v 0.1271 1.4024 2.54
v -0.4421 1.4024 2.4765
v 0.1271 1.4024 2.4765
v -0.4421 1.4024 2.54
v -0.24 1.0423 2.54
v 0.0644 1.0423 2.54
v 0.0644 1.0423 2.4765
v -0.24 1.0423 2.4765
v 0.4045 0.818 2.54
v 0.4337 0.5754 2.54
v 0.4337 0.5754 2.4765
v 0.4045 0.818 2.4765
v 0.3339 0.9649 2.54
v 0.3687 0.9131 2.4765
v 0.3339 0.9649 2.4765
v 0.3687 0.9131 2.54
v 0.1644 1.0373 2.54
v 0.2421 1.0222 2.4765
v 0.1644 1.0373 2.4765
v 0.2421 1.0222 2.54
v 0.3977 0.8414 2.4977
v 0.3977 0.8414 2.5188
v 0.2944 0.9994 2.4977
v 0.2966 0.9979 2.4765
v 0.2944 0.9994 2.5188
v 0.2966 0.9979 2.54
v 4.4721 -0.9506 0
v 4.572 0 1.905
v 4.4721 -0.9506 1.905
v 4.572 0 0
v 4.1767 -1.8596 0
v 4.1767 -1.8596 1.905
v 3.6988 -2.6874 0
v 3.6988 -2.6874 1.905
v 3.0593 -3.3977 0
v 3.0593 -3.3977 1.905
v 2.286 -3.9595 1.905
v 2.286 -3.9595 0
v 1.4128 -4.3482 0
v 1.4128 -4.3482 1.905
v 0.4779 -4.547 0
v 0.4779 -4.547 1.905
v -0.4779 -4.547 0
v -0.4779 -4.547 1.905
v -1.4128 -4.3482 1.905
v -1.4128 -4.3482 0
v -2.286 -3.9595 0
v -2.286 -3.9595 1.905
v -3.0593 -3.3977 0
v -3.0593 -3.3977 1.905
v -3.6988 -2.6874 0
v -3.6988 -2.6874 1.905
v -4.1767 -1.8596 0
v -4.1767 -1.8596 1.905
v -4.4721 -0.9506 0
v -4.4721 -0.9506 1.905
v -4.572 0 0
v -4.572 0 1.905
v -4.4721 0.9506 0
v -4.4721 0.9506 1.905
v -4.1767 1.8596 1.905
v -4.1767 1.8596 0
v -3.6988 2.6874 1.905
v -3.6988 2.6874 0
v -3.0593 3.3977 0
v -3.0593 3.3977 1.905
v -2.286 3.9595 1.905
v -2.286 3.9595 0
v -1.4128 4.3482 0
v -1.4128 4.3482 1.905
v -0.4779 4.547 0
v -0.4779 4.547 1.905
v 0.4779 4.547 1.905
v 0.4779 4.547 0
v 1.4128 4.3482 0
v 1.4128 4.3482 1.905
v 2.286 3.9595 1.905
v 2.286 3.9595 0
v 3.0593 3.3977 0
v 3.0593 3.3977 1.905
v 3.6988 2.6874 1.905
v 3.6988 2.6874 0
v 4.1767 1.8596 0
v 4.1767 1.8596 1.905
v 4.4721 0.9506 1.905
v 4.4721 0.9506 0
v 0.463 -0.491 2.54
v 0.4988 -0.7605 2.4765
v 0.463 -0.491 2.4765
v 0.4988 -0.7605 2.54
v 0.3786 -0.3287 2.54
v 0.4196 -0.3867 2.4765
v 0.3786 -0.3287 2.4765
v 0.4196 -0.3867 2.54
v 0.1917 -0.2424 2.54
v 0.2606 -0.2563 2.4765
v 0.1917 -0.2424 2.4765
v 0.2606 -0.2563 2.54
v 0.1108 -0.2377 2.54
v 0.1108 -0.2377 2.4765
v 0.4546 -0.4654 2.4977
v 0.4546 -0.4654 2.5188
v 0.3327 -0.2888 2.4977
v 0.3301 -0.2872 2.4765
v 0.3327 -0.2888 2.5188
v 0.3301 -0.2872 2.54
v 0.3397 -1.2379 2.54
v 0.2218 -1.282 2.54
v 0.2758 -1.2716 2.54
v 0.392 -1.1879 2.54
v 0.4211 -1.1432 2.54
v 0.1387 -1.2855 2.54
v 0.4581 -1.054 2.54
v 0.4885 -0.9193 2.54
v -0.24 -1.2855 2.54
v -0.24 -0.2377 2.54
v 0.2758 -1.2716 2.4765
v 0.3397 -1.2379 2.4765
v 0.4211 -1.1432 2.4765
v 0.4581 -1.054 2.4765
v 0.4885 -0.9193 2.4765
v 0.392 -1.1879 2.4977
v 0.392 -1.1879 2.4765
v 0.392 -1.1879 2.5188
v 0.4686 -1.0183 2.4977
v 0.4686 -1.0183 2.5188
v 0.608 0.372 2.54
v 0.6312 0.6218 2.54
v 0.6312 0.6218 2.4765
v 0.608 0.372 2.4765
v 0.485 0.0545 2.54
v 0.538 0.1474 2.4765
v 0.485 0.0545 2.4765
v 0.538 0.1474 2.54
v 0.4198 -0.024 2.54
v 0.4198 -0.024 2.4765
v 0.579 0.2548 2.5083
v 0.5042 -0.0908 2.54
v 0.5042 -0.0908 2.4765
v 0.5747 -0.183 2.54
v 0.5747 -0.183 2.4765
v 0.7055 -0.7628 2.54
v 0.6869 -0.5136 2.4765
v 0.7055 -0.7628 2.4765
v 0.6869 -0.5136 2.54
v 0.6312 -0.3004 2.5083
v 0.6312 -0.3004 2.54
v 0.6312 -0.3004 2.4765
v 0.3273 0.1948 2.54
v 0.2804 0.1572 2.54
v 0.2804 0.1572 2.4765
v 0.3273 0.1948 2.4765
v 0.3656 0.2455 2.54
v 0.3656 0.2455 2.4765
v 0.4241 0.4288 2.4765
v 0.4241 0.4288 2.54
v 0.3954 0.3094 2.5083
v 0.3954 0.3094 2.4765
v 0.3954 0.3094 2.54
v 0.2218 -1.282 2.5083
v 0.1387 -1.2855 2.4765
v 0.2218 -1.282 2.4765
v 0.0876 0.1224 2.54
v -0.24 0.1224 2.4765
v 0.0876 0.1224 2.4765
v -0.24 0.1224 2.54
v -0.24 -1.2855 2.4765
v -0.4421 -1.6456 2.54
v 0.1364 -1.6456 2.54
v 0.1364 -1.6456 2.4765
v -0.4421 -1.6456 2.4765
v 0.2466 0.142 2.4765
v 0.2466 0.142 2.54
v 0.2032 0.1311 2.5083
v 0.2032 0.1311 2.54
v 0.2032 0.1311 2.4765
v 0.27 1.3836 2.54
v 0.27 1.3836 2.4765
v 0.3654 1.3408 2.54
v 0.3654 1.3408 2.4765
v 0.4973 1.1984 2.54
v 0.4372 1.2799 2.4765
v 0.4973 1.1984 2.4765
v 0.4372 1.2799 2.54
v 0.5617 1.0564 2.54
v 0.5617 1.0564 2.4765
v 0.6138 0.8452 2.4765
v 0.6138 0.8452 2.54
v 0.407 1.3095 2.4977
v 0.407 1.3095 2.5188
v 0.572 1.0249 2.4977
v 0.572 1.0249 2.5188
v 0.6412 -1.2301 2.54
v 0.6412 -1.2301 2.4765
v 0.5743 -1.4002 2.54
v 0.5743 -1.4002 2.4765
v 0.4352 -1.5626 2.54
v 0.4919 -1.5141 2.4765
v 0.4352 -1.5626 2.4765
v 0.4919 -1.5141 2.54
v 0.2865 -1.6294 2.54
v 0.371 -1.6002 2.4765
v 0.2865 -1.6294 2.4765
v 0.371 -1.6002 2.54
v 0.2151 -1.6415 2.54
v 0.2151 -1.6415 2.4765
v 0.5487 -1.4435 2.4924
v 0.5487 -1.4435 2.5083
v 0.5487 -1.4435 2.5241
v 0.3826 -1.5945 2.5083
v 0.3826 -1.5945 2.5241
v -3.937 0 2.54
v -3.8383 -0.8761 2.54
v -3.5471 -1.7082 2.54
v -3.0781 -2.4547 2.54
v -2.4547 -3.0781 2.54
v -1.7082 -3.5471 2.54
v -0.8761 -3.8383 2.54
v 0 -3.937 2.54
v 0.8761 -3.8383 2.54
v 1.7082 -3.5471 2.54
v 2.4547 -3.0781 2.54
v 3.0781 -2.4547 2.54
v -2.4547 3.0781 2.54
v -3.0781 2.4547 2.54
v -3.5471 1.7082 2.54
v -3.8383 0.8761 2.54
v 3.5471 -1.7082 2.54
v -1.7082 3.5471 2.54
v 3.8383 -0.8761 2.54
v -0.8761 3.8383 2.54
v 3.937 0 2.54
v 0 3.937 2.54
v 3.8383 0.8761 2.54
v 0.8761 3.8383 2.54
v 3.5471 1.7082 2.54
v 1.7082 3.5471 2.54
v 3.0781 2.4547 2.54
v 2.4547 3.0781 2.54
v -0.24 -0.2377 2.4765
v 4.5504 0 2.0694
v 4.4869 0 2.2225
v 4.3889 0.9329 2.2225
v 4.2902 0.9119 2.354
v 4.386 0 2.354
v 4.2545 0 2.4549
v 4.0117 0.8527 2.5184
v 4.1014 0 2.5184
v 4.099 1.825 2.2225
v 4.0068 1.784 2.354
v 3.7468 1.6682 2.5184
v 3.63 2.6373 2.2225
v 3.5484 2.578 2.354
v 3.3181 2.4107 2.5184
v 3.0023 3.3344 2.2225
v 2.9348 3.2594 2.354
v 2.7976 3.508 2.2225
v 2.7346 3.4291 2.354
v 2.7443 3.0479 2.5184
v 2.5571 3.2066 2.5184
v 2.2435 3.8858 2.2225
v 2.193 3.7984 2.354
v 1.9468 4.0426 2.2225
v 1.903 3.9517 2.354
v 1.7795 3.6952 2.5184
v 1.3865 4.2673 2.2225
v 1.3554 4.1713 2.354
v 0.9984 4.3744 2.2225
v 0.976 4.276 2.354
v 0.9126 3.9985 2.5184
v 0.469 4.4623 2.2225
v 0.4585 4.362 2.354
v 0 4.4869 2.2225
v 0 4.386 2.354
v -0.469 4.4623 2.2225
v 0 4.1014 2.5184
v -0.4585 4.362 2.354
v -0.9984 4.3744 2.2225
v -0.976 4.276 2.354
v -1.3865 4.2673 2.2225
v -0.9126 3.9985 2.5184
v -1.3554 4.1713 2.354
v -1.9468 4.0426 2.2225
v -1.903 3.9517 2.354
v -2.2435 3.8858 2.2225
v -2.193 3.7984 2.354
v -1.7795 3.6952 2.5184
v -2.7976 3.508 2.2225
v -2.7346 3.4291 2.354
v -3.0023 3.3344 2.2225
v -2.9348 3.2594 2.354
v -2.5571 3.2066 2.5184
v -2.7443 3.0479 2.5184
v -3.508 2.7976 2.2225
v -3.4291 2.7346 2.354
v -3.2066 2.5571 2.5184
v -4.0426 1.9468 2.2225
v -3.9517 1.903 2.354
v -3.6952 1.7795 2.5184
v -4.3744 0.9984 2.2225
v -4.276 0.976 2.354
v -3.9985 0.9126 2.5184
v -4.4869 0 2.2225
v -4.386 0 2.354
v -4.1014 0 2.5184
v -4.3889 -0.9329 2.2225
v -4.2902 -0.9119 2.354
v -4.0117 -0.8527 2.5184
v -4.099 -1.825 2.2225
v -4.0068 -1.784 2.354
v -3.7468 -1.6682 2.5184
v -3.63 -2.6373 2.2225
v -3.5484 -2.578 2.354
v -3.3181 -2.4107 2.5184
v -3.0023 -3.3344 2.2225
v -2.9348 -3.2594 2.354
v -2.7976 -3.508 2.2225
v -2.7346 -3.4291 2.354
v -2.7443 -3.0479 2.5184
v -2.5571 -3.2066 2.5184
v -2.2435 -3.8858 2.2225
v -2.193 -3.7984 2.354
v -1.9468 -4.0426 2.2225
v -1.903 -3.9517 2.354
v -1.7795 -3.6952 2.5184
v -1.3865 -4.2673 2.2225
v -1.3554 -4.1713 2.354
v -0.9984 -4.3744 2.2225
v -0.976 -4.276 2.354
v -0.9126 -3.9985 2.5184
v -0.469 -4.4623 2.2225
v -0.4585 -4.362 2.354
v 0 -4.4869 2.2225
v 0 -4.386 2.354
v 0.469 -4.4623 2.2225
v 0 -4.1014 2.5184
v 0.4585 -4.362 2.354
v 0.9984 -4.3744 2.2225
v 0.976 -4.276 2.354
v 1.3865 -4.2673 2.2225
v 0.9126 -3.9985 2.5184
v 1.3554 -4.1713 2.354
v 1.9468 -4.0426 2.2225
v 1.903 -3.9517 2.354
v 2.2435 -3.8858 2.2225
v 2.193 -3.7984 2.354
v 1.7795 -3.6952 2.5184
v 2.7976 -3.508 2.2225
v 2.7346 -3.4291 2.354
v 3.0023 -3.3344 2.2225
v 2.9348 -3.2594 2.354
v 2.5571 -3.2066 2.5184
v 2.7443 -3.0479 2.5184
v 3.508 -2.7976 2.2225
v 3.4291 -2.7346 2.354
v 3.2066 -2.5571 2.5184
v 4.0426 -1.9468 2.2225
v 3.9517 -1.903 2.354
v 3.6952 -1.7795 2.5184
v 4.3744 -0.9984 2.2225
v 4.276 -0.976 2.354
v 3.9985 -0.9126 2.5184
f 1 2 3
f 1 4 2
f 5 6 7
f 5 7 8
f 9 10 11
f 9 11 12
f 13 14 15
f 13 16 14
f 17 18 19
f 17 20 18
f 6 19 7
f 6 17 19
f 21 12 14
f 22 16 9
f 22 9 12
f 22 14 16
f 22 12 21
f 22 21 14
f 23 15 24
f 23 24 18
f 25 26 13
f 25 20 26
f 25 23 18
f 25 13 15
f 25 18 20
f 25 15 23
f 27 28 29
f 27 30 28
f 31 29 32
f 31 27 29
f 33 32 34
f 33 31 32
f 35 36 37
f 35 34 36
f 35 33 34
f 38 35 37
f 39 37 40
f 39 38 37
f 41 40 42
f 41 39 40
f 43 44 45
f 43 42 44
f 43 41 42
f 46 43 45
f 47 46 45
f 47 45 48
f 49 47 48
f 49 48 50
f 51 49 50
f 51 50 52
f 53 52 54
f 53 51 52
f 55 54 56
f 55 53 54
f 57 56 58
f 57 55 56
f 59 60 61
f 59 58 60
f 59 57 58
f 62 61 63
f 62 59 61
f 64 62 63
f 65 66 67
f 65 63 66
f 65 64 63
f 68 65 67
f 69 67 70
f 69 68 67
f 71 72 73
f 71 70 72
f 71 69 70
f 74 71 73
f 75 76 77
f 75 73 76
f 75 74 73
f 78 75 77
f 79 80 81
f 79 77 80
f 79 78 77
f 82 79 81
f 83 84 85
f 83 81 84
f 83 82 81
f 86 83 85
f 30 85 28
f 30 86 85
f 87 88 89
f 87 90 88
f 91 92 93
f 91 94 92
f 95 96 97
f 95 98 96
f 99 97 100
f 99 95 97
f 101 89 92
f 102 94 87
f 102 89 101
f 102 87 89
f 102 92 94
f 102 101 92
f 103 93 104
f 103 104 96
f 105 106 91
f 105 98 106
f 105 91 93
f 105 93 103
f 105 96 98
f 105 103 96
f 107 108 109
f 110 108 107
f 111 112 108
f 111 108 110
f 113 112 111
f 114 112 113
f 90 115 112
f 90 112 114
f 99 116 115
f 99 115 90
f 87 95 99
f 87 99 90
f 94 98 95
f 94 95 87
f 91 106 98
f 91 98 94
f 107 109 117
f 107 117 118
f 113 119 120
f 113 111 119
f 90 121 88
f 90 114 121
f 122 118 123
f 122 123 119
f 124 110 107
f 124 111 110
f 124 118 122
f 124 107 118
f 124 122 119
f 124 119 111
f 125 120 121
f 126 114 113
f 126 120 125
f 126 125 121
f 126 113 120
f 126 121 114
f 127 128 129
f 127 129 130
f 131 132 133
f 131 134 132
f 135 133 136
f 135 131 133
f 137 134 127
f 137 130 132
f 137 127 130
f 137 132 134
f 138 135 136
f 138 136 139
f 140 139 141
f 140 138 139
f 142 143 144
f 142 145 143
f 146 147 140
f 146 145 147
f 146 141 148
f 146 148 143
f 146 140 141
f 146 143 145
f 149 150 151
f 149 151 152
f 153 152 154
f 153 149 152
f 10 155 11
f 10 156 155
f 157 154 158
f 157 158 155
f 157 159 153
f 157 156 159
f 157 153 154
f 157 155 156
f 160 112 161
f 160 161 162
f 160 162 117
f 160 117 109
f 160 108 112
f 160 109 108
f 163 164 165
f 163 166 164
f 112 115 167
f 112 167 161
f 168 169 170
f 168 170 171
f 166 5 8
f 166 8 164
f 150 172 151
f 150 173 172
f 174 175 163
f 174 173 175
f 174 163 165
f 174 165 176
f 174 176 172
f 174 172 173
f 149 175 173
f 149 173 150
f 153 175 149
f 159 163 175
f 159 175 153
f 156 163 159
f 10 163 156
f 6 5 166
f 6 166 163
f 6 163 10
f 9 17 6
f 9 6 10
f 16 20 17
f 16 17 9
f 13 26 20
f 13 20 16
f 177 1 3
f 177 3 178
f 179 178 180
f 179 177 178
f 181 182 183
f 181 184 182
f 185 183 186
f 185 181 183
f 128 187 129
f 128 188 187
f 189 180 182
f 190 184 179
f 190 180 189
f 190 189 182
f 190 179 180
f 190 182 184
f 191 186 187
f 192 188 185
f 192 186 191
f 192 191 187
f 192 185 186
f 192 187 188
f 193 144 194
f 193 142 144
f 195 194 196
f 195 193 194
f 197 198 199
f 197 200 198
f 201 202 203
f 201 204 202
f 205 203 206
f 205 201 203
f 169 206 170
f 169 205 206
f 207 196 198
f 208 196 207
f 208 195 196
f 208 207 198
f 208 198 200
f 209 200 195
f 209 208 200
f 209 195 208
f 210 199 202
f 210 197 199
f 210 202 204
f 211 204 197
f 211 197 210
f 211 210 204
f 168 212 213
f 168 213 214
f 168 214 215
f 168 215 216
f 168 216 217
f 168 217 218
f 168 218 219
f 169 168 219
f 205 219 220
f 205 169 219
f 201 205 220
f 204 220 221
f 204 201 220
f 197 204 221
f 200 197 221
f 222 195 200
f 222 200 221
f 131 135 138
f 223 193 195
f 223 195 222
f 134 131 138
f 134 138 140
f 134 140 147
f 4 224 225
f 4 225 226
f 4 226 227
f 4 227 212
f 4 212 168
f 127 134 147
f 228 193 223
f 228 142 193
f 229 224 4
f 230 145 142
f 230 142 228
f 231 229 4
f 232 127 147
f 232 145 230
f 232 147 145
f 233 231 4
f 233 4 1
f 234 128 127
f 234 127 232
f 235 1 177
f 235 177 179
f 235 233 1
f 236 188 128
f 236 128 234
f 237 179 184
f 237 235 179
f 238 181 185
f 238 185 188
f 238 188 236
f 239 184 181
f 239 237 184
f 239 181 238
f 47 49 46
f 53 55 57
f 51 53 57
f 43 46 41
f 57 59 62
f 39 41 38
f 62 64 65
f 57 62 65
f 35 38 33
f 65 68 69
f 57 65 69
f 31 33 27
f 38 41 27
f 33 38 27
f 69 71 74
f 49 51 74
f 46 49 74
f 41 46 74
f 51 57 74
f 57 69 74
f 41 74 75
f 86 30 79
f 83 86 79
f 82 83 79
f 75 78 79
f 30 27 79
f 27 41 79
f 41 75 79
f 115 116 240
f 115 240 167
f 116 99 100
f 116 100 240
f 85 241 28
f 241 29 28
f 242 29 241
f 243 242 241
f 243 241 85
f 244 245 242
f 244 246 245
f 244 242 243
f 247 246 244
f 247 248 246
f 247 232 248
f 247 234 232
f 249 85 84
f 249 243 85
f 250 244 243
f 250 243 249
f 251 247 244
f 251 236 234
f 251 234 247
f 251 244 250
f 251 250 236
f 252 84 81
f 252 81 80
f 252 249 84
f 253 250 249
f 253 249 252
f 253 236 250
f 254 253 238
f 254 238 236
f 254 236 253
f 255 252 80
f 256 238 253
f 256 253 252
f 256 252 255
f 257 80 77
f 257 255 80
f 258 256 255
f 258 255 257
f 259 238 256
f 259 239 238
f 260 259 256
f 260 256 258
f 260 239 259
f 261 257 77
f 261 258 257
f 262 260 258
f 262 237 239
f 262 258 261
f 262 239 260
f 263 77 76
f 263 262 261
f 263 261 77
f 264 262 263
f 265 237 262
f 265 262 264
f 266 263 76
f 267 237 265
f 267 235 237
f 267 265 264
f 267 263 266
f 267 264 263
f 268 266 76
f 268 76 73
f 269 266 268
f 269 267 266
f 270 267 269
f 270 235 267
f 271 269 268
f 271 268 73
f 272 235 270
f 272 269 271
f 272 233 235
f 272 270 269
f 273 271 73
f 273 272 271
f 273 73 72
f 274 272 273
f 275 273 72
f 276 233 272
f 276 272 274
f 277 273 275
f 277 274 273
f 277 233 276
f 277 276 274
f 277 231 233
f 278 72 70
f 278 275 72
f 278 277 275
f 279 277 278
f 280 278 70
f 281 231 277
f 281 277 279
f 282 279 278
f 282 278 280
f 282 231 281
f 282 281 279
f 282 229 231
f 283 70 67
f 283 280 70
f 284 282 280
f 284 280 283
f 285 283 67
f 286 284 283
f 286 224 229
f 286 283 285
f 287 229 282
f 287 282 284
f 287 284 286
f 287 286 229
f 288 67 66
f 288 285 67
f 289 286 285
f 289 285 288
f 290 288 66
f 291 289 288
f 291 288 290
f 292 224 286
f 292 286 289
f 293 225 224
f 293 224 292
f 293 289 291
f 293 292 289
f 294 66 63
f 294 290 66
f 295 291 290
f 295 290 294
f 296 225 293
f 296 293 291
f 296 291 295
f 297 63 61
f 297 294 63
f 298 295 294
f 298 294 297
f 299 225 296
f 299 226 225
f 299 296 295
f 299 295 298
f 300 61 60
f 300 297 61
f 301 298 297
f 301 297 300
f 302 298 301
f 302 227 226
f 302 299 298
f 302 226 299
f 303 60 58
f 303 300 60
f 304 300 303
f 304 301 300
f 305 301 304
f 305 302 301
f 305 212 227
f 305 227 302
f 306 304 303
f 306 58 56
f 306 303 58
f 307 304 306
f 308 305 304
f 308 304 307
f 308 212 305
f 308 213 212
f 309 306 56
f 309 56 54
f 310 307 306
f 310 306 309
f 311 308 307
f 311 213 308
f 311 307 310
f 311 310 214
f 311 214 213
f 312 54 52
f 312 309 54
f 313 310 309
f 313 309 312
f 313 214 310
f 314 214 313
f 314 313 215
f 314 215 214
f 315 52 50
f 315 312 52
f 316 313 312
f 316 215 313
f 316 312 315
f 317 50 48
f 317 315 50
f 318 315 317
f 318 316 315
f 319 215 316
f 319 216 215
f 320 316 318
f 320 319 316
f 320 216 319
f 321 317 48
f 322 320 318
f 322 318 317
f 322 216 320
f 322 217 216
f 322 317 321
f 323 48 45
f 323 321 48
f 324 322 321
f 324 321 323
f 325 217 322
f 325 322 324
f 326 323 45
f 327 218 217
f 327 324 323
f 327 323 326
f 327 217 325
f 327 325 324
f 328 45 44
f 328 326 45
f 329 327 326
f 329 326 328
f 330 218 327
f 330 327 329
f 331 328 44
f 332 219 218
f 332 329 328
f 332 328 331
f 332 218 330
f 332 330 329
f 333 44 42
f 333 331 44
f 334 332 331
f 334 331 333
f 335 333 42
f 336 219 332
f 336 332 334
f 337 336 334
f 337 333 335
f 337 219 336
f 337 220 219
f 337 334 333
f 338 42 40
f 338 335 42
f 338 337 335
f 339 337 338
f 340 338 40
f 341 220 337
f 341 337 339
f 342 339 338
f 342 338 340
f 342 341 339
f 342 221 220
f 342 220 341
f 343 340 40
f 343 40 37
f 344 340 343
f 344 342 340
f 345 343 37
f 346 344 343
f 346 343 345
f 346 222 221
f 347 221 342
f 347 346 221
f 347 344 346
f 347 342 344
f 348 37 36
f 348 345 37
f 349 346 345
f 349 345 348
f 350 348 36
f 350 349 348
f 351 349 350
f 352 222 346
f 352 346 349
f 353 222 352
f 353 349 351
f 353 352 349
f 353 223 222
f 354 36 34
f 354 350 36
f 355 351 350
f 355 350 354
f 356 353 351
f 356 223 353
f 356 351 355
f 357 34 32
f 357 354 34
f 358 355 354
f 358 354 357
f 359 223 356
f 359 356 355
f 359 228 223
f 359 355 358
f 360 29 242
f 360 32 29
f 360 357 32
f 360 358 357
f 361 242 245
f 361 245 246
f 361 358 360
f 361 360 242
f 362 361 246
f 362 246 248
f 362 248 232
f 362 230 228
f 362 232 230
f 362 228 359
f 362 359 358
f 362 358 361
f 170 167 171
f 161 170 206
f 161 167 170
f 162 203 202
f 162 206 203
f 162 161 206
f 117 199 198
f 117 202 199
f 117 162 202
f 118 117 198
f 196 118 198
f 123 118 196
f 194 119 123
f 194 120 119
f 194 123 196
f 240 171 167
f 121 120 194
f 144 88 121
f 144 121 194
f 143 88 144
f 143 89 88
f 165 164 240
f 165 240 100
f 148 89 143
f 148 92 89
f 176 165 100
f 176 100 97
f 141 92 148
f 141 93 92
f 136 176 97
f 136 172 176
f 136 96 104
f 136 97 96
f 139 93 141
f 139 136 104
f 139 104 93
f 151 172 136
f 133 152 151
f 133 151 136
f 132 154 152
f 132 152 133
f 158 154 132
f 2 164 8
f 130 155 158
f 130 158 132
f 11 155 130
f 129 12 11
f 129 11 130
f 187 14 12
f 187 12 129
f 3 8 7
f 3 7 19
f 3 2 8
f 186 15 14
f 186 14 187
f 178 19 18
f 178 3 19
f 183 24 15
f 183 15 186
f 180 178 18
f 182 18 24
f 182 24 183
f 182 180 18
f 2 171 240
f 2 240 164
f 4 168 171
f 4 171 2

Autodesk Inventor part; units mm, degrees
ref_plane "YZ Plane" through (0, 0, 0) normal (1, 0, 0) x (0, 1, 0)
ref_plane "XZ Plane" through (0, 0, 0) normal (0, 1, 0) x (-1, 0, 0)
ref_plane "XY Plane" through (0, 0, 0) normal (0, 0, 1) x (1, 0, 0)
sketch "Sketch1" plane through (0, 0, 0) normal (0, 0, 1) x (1, 0, 0)
  circle A0 centre (0, 0) radius 4.572
  dimension "d0" = 9.144
extrude "Extrusion1" add sketch "Sketch1" along normal blind 2.54
fillet "Fillet1" radius 0.635 1 edges at (-4.572, 0, 2.54)
sketch "Sketch2" plane through (0, 0, 2.54) normal (0, 0, 1) x (1, 0, 0)
  line L0 (-0.5978, 1.4024) -> (2.1711, 1.4024) construction
  line L1 (2.1711, 1.4024) -> (2.1711, -1.6456) construction
  line L2 (2.1711, -1.6456) -> (-0.5978, -1.6456) construction
  line L3 (-0.5978, -1.6456) -> (-0.5978, 1.4024) construction
  line L4 (-0.4421, -1.6456) -> (-0.4421, 1.4024)
  line L5 (-0.4421, 1.4024) -> (0.1271, 1.4024)
  spline S0 degree 2 poles (0.1271, 1.4024) (0.3013, 1.4024) (0.5127, 1.2166) (0.6312, 0.8332) (0.6312, 0.6218) knots 0 0 0 1 2 3 3 3
  spline S1 degree 2 poles (0.6312, 0.6218) (0.6312, 0.4267) (0.5267, 0.0829) (0.4198, -0.024) knots 0 0 0 1 2 2 2
  spline S2 degree 2 poles (0.4198, -0.024) (0.5569, -0.1053) (0.7055, -0.4956) (0.7055, -0.7628) knots 0 0 0 1 2 2 2
  spline S3 degree 2 poles (0.7055, -0.7628) (0.7055, -0.9765) (0.6149, -1.3436) (0.4825, -1.5434) (0.2827, -1.6456) (0.1364, -1.6456) knots 0 0 0 1 2 3 4 4 4
  line L6 (0.1364, -1.6456) -> (-0.4421, -1.6456)
  line L7 (-0.24, -1.2855) -> (0.1387, -1.2855)
  spline S4 degree 2 poles (0.1387, -1.2855) (0.2363, -1.2855) (0.2758, -1.2716) knots 0 0 0 1 1 1
  spline S5 degree 2 poles (0.2758, -1.2716) (0.3455, -1.246) (0.4384, -1.1298) (0.4988, -0.9068) (0.4988, -0.7605) knots 0 0 0 1 2 3 3 3
  spline S6 degree 2 poles (0.4988, -0.7605) (0.4988, -0.5909) (0.4105, -0.34) (0.2549, -0.2377) (0.1108, -0.2377) knots 0 0 0 1 2 3 3 3
  line L8 (0.1108, -0.2377) -> (-0.24, -0.2377)
  line L9 (-0.24, -0.2377) -> (-0.24, -1.2855)
  line L10 (-0.24, 0.1224) -> (0.0876, 0.1224)
  spline S7 degree 2 poles (0.0876, 0.1224) (0.2223, 0.1224) (0.2804, 0.1572) knots 0 0 0 1 1 1
  spline S8 degree 2 poles (0.2804, 0.1572) (0.3571, 0.2037) (0.4337, 0.4151) (0.4337, 0.5754) knots 0 0 0 1 2 2 2
  spline S9 degree 2 poles (0.4337, 0.5754) (0.4337, 0.7264) (0.3617, 0.9564) (0.227, 1.0423) (0.0644, 1.0423) knots 0 0 0 1 2 3 3 3
  line L11 (0.0644, 1.0423) -> (-0.24, 1.0423)
  line L12 (-0.24, 1.0423) -> (-0.24, 0.1224)
extrude "Extrusion2" cut sketch "Sketch2" against normal blind 0.0635
properties part number "B Button"
